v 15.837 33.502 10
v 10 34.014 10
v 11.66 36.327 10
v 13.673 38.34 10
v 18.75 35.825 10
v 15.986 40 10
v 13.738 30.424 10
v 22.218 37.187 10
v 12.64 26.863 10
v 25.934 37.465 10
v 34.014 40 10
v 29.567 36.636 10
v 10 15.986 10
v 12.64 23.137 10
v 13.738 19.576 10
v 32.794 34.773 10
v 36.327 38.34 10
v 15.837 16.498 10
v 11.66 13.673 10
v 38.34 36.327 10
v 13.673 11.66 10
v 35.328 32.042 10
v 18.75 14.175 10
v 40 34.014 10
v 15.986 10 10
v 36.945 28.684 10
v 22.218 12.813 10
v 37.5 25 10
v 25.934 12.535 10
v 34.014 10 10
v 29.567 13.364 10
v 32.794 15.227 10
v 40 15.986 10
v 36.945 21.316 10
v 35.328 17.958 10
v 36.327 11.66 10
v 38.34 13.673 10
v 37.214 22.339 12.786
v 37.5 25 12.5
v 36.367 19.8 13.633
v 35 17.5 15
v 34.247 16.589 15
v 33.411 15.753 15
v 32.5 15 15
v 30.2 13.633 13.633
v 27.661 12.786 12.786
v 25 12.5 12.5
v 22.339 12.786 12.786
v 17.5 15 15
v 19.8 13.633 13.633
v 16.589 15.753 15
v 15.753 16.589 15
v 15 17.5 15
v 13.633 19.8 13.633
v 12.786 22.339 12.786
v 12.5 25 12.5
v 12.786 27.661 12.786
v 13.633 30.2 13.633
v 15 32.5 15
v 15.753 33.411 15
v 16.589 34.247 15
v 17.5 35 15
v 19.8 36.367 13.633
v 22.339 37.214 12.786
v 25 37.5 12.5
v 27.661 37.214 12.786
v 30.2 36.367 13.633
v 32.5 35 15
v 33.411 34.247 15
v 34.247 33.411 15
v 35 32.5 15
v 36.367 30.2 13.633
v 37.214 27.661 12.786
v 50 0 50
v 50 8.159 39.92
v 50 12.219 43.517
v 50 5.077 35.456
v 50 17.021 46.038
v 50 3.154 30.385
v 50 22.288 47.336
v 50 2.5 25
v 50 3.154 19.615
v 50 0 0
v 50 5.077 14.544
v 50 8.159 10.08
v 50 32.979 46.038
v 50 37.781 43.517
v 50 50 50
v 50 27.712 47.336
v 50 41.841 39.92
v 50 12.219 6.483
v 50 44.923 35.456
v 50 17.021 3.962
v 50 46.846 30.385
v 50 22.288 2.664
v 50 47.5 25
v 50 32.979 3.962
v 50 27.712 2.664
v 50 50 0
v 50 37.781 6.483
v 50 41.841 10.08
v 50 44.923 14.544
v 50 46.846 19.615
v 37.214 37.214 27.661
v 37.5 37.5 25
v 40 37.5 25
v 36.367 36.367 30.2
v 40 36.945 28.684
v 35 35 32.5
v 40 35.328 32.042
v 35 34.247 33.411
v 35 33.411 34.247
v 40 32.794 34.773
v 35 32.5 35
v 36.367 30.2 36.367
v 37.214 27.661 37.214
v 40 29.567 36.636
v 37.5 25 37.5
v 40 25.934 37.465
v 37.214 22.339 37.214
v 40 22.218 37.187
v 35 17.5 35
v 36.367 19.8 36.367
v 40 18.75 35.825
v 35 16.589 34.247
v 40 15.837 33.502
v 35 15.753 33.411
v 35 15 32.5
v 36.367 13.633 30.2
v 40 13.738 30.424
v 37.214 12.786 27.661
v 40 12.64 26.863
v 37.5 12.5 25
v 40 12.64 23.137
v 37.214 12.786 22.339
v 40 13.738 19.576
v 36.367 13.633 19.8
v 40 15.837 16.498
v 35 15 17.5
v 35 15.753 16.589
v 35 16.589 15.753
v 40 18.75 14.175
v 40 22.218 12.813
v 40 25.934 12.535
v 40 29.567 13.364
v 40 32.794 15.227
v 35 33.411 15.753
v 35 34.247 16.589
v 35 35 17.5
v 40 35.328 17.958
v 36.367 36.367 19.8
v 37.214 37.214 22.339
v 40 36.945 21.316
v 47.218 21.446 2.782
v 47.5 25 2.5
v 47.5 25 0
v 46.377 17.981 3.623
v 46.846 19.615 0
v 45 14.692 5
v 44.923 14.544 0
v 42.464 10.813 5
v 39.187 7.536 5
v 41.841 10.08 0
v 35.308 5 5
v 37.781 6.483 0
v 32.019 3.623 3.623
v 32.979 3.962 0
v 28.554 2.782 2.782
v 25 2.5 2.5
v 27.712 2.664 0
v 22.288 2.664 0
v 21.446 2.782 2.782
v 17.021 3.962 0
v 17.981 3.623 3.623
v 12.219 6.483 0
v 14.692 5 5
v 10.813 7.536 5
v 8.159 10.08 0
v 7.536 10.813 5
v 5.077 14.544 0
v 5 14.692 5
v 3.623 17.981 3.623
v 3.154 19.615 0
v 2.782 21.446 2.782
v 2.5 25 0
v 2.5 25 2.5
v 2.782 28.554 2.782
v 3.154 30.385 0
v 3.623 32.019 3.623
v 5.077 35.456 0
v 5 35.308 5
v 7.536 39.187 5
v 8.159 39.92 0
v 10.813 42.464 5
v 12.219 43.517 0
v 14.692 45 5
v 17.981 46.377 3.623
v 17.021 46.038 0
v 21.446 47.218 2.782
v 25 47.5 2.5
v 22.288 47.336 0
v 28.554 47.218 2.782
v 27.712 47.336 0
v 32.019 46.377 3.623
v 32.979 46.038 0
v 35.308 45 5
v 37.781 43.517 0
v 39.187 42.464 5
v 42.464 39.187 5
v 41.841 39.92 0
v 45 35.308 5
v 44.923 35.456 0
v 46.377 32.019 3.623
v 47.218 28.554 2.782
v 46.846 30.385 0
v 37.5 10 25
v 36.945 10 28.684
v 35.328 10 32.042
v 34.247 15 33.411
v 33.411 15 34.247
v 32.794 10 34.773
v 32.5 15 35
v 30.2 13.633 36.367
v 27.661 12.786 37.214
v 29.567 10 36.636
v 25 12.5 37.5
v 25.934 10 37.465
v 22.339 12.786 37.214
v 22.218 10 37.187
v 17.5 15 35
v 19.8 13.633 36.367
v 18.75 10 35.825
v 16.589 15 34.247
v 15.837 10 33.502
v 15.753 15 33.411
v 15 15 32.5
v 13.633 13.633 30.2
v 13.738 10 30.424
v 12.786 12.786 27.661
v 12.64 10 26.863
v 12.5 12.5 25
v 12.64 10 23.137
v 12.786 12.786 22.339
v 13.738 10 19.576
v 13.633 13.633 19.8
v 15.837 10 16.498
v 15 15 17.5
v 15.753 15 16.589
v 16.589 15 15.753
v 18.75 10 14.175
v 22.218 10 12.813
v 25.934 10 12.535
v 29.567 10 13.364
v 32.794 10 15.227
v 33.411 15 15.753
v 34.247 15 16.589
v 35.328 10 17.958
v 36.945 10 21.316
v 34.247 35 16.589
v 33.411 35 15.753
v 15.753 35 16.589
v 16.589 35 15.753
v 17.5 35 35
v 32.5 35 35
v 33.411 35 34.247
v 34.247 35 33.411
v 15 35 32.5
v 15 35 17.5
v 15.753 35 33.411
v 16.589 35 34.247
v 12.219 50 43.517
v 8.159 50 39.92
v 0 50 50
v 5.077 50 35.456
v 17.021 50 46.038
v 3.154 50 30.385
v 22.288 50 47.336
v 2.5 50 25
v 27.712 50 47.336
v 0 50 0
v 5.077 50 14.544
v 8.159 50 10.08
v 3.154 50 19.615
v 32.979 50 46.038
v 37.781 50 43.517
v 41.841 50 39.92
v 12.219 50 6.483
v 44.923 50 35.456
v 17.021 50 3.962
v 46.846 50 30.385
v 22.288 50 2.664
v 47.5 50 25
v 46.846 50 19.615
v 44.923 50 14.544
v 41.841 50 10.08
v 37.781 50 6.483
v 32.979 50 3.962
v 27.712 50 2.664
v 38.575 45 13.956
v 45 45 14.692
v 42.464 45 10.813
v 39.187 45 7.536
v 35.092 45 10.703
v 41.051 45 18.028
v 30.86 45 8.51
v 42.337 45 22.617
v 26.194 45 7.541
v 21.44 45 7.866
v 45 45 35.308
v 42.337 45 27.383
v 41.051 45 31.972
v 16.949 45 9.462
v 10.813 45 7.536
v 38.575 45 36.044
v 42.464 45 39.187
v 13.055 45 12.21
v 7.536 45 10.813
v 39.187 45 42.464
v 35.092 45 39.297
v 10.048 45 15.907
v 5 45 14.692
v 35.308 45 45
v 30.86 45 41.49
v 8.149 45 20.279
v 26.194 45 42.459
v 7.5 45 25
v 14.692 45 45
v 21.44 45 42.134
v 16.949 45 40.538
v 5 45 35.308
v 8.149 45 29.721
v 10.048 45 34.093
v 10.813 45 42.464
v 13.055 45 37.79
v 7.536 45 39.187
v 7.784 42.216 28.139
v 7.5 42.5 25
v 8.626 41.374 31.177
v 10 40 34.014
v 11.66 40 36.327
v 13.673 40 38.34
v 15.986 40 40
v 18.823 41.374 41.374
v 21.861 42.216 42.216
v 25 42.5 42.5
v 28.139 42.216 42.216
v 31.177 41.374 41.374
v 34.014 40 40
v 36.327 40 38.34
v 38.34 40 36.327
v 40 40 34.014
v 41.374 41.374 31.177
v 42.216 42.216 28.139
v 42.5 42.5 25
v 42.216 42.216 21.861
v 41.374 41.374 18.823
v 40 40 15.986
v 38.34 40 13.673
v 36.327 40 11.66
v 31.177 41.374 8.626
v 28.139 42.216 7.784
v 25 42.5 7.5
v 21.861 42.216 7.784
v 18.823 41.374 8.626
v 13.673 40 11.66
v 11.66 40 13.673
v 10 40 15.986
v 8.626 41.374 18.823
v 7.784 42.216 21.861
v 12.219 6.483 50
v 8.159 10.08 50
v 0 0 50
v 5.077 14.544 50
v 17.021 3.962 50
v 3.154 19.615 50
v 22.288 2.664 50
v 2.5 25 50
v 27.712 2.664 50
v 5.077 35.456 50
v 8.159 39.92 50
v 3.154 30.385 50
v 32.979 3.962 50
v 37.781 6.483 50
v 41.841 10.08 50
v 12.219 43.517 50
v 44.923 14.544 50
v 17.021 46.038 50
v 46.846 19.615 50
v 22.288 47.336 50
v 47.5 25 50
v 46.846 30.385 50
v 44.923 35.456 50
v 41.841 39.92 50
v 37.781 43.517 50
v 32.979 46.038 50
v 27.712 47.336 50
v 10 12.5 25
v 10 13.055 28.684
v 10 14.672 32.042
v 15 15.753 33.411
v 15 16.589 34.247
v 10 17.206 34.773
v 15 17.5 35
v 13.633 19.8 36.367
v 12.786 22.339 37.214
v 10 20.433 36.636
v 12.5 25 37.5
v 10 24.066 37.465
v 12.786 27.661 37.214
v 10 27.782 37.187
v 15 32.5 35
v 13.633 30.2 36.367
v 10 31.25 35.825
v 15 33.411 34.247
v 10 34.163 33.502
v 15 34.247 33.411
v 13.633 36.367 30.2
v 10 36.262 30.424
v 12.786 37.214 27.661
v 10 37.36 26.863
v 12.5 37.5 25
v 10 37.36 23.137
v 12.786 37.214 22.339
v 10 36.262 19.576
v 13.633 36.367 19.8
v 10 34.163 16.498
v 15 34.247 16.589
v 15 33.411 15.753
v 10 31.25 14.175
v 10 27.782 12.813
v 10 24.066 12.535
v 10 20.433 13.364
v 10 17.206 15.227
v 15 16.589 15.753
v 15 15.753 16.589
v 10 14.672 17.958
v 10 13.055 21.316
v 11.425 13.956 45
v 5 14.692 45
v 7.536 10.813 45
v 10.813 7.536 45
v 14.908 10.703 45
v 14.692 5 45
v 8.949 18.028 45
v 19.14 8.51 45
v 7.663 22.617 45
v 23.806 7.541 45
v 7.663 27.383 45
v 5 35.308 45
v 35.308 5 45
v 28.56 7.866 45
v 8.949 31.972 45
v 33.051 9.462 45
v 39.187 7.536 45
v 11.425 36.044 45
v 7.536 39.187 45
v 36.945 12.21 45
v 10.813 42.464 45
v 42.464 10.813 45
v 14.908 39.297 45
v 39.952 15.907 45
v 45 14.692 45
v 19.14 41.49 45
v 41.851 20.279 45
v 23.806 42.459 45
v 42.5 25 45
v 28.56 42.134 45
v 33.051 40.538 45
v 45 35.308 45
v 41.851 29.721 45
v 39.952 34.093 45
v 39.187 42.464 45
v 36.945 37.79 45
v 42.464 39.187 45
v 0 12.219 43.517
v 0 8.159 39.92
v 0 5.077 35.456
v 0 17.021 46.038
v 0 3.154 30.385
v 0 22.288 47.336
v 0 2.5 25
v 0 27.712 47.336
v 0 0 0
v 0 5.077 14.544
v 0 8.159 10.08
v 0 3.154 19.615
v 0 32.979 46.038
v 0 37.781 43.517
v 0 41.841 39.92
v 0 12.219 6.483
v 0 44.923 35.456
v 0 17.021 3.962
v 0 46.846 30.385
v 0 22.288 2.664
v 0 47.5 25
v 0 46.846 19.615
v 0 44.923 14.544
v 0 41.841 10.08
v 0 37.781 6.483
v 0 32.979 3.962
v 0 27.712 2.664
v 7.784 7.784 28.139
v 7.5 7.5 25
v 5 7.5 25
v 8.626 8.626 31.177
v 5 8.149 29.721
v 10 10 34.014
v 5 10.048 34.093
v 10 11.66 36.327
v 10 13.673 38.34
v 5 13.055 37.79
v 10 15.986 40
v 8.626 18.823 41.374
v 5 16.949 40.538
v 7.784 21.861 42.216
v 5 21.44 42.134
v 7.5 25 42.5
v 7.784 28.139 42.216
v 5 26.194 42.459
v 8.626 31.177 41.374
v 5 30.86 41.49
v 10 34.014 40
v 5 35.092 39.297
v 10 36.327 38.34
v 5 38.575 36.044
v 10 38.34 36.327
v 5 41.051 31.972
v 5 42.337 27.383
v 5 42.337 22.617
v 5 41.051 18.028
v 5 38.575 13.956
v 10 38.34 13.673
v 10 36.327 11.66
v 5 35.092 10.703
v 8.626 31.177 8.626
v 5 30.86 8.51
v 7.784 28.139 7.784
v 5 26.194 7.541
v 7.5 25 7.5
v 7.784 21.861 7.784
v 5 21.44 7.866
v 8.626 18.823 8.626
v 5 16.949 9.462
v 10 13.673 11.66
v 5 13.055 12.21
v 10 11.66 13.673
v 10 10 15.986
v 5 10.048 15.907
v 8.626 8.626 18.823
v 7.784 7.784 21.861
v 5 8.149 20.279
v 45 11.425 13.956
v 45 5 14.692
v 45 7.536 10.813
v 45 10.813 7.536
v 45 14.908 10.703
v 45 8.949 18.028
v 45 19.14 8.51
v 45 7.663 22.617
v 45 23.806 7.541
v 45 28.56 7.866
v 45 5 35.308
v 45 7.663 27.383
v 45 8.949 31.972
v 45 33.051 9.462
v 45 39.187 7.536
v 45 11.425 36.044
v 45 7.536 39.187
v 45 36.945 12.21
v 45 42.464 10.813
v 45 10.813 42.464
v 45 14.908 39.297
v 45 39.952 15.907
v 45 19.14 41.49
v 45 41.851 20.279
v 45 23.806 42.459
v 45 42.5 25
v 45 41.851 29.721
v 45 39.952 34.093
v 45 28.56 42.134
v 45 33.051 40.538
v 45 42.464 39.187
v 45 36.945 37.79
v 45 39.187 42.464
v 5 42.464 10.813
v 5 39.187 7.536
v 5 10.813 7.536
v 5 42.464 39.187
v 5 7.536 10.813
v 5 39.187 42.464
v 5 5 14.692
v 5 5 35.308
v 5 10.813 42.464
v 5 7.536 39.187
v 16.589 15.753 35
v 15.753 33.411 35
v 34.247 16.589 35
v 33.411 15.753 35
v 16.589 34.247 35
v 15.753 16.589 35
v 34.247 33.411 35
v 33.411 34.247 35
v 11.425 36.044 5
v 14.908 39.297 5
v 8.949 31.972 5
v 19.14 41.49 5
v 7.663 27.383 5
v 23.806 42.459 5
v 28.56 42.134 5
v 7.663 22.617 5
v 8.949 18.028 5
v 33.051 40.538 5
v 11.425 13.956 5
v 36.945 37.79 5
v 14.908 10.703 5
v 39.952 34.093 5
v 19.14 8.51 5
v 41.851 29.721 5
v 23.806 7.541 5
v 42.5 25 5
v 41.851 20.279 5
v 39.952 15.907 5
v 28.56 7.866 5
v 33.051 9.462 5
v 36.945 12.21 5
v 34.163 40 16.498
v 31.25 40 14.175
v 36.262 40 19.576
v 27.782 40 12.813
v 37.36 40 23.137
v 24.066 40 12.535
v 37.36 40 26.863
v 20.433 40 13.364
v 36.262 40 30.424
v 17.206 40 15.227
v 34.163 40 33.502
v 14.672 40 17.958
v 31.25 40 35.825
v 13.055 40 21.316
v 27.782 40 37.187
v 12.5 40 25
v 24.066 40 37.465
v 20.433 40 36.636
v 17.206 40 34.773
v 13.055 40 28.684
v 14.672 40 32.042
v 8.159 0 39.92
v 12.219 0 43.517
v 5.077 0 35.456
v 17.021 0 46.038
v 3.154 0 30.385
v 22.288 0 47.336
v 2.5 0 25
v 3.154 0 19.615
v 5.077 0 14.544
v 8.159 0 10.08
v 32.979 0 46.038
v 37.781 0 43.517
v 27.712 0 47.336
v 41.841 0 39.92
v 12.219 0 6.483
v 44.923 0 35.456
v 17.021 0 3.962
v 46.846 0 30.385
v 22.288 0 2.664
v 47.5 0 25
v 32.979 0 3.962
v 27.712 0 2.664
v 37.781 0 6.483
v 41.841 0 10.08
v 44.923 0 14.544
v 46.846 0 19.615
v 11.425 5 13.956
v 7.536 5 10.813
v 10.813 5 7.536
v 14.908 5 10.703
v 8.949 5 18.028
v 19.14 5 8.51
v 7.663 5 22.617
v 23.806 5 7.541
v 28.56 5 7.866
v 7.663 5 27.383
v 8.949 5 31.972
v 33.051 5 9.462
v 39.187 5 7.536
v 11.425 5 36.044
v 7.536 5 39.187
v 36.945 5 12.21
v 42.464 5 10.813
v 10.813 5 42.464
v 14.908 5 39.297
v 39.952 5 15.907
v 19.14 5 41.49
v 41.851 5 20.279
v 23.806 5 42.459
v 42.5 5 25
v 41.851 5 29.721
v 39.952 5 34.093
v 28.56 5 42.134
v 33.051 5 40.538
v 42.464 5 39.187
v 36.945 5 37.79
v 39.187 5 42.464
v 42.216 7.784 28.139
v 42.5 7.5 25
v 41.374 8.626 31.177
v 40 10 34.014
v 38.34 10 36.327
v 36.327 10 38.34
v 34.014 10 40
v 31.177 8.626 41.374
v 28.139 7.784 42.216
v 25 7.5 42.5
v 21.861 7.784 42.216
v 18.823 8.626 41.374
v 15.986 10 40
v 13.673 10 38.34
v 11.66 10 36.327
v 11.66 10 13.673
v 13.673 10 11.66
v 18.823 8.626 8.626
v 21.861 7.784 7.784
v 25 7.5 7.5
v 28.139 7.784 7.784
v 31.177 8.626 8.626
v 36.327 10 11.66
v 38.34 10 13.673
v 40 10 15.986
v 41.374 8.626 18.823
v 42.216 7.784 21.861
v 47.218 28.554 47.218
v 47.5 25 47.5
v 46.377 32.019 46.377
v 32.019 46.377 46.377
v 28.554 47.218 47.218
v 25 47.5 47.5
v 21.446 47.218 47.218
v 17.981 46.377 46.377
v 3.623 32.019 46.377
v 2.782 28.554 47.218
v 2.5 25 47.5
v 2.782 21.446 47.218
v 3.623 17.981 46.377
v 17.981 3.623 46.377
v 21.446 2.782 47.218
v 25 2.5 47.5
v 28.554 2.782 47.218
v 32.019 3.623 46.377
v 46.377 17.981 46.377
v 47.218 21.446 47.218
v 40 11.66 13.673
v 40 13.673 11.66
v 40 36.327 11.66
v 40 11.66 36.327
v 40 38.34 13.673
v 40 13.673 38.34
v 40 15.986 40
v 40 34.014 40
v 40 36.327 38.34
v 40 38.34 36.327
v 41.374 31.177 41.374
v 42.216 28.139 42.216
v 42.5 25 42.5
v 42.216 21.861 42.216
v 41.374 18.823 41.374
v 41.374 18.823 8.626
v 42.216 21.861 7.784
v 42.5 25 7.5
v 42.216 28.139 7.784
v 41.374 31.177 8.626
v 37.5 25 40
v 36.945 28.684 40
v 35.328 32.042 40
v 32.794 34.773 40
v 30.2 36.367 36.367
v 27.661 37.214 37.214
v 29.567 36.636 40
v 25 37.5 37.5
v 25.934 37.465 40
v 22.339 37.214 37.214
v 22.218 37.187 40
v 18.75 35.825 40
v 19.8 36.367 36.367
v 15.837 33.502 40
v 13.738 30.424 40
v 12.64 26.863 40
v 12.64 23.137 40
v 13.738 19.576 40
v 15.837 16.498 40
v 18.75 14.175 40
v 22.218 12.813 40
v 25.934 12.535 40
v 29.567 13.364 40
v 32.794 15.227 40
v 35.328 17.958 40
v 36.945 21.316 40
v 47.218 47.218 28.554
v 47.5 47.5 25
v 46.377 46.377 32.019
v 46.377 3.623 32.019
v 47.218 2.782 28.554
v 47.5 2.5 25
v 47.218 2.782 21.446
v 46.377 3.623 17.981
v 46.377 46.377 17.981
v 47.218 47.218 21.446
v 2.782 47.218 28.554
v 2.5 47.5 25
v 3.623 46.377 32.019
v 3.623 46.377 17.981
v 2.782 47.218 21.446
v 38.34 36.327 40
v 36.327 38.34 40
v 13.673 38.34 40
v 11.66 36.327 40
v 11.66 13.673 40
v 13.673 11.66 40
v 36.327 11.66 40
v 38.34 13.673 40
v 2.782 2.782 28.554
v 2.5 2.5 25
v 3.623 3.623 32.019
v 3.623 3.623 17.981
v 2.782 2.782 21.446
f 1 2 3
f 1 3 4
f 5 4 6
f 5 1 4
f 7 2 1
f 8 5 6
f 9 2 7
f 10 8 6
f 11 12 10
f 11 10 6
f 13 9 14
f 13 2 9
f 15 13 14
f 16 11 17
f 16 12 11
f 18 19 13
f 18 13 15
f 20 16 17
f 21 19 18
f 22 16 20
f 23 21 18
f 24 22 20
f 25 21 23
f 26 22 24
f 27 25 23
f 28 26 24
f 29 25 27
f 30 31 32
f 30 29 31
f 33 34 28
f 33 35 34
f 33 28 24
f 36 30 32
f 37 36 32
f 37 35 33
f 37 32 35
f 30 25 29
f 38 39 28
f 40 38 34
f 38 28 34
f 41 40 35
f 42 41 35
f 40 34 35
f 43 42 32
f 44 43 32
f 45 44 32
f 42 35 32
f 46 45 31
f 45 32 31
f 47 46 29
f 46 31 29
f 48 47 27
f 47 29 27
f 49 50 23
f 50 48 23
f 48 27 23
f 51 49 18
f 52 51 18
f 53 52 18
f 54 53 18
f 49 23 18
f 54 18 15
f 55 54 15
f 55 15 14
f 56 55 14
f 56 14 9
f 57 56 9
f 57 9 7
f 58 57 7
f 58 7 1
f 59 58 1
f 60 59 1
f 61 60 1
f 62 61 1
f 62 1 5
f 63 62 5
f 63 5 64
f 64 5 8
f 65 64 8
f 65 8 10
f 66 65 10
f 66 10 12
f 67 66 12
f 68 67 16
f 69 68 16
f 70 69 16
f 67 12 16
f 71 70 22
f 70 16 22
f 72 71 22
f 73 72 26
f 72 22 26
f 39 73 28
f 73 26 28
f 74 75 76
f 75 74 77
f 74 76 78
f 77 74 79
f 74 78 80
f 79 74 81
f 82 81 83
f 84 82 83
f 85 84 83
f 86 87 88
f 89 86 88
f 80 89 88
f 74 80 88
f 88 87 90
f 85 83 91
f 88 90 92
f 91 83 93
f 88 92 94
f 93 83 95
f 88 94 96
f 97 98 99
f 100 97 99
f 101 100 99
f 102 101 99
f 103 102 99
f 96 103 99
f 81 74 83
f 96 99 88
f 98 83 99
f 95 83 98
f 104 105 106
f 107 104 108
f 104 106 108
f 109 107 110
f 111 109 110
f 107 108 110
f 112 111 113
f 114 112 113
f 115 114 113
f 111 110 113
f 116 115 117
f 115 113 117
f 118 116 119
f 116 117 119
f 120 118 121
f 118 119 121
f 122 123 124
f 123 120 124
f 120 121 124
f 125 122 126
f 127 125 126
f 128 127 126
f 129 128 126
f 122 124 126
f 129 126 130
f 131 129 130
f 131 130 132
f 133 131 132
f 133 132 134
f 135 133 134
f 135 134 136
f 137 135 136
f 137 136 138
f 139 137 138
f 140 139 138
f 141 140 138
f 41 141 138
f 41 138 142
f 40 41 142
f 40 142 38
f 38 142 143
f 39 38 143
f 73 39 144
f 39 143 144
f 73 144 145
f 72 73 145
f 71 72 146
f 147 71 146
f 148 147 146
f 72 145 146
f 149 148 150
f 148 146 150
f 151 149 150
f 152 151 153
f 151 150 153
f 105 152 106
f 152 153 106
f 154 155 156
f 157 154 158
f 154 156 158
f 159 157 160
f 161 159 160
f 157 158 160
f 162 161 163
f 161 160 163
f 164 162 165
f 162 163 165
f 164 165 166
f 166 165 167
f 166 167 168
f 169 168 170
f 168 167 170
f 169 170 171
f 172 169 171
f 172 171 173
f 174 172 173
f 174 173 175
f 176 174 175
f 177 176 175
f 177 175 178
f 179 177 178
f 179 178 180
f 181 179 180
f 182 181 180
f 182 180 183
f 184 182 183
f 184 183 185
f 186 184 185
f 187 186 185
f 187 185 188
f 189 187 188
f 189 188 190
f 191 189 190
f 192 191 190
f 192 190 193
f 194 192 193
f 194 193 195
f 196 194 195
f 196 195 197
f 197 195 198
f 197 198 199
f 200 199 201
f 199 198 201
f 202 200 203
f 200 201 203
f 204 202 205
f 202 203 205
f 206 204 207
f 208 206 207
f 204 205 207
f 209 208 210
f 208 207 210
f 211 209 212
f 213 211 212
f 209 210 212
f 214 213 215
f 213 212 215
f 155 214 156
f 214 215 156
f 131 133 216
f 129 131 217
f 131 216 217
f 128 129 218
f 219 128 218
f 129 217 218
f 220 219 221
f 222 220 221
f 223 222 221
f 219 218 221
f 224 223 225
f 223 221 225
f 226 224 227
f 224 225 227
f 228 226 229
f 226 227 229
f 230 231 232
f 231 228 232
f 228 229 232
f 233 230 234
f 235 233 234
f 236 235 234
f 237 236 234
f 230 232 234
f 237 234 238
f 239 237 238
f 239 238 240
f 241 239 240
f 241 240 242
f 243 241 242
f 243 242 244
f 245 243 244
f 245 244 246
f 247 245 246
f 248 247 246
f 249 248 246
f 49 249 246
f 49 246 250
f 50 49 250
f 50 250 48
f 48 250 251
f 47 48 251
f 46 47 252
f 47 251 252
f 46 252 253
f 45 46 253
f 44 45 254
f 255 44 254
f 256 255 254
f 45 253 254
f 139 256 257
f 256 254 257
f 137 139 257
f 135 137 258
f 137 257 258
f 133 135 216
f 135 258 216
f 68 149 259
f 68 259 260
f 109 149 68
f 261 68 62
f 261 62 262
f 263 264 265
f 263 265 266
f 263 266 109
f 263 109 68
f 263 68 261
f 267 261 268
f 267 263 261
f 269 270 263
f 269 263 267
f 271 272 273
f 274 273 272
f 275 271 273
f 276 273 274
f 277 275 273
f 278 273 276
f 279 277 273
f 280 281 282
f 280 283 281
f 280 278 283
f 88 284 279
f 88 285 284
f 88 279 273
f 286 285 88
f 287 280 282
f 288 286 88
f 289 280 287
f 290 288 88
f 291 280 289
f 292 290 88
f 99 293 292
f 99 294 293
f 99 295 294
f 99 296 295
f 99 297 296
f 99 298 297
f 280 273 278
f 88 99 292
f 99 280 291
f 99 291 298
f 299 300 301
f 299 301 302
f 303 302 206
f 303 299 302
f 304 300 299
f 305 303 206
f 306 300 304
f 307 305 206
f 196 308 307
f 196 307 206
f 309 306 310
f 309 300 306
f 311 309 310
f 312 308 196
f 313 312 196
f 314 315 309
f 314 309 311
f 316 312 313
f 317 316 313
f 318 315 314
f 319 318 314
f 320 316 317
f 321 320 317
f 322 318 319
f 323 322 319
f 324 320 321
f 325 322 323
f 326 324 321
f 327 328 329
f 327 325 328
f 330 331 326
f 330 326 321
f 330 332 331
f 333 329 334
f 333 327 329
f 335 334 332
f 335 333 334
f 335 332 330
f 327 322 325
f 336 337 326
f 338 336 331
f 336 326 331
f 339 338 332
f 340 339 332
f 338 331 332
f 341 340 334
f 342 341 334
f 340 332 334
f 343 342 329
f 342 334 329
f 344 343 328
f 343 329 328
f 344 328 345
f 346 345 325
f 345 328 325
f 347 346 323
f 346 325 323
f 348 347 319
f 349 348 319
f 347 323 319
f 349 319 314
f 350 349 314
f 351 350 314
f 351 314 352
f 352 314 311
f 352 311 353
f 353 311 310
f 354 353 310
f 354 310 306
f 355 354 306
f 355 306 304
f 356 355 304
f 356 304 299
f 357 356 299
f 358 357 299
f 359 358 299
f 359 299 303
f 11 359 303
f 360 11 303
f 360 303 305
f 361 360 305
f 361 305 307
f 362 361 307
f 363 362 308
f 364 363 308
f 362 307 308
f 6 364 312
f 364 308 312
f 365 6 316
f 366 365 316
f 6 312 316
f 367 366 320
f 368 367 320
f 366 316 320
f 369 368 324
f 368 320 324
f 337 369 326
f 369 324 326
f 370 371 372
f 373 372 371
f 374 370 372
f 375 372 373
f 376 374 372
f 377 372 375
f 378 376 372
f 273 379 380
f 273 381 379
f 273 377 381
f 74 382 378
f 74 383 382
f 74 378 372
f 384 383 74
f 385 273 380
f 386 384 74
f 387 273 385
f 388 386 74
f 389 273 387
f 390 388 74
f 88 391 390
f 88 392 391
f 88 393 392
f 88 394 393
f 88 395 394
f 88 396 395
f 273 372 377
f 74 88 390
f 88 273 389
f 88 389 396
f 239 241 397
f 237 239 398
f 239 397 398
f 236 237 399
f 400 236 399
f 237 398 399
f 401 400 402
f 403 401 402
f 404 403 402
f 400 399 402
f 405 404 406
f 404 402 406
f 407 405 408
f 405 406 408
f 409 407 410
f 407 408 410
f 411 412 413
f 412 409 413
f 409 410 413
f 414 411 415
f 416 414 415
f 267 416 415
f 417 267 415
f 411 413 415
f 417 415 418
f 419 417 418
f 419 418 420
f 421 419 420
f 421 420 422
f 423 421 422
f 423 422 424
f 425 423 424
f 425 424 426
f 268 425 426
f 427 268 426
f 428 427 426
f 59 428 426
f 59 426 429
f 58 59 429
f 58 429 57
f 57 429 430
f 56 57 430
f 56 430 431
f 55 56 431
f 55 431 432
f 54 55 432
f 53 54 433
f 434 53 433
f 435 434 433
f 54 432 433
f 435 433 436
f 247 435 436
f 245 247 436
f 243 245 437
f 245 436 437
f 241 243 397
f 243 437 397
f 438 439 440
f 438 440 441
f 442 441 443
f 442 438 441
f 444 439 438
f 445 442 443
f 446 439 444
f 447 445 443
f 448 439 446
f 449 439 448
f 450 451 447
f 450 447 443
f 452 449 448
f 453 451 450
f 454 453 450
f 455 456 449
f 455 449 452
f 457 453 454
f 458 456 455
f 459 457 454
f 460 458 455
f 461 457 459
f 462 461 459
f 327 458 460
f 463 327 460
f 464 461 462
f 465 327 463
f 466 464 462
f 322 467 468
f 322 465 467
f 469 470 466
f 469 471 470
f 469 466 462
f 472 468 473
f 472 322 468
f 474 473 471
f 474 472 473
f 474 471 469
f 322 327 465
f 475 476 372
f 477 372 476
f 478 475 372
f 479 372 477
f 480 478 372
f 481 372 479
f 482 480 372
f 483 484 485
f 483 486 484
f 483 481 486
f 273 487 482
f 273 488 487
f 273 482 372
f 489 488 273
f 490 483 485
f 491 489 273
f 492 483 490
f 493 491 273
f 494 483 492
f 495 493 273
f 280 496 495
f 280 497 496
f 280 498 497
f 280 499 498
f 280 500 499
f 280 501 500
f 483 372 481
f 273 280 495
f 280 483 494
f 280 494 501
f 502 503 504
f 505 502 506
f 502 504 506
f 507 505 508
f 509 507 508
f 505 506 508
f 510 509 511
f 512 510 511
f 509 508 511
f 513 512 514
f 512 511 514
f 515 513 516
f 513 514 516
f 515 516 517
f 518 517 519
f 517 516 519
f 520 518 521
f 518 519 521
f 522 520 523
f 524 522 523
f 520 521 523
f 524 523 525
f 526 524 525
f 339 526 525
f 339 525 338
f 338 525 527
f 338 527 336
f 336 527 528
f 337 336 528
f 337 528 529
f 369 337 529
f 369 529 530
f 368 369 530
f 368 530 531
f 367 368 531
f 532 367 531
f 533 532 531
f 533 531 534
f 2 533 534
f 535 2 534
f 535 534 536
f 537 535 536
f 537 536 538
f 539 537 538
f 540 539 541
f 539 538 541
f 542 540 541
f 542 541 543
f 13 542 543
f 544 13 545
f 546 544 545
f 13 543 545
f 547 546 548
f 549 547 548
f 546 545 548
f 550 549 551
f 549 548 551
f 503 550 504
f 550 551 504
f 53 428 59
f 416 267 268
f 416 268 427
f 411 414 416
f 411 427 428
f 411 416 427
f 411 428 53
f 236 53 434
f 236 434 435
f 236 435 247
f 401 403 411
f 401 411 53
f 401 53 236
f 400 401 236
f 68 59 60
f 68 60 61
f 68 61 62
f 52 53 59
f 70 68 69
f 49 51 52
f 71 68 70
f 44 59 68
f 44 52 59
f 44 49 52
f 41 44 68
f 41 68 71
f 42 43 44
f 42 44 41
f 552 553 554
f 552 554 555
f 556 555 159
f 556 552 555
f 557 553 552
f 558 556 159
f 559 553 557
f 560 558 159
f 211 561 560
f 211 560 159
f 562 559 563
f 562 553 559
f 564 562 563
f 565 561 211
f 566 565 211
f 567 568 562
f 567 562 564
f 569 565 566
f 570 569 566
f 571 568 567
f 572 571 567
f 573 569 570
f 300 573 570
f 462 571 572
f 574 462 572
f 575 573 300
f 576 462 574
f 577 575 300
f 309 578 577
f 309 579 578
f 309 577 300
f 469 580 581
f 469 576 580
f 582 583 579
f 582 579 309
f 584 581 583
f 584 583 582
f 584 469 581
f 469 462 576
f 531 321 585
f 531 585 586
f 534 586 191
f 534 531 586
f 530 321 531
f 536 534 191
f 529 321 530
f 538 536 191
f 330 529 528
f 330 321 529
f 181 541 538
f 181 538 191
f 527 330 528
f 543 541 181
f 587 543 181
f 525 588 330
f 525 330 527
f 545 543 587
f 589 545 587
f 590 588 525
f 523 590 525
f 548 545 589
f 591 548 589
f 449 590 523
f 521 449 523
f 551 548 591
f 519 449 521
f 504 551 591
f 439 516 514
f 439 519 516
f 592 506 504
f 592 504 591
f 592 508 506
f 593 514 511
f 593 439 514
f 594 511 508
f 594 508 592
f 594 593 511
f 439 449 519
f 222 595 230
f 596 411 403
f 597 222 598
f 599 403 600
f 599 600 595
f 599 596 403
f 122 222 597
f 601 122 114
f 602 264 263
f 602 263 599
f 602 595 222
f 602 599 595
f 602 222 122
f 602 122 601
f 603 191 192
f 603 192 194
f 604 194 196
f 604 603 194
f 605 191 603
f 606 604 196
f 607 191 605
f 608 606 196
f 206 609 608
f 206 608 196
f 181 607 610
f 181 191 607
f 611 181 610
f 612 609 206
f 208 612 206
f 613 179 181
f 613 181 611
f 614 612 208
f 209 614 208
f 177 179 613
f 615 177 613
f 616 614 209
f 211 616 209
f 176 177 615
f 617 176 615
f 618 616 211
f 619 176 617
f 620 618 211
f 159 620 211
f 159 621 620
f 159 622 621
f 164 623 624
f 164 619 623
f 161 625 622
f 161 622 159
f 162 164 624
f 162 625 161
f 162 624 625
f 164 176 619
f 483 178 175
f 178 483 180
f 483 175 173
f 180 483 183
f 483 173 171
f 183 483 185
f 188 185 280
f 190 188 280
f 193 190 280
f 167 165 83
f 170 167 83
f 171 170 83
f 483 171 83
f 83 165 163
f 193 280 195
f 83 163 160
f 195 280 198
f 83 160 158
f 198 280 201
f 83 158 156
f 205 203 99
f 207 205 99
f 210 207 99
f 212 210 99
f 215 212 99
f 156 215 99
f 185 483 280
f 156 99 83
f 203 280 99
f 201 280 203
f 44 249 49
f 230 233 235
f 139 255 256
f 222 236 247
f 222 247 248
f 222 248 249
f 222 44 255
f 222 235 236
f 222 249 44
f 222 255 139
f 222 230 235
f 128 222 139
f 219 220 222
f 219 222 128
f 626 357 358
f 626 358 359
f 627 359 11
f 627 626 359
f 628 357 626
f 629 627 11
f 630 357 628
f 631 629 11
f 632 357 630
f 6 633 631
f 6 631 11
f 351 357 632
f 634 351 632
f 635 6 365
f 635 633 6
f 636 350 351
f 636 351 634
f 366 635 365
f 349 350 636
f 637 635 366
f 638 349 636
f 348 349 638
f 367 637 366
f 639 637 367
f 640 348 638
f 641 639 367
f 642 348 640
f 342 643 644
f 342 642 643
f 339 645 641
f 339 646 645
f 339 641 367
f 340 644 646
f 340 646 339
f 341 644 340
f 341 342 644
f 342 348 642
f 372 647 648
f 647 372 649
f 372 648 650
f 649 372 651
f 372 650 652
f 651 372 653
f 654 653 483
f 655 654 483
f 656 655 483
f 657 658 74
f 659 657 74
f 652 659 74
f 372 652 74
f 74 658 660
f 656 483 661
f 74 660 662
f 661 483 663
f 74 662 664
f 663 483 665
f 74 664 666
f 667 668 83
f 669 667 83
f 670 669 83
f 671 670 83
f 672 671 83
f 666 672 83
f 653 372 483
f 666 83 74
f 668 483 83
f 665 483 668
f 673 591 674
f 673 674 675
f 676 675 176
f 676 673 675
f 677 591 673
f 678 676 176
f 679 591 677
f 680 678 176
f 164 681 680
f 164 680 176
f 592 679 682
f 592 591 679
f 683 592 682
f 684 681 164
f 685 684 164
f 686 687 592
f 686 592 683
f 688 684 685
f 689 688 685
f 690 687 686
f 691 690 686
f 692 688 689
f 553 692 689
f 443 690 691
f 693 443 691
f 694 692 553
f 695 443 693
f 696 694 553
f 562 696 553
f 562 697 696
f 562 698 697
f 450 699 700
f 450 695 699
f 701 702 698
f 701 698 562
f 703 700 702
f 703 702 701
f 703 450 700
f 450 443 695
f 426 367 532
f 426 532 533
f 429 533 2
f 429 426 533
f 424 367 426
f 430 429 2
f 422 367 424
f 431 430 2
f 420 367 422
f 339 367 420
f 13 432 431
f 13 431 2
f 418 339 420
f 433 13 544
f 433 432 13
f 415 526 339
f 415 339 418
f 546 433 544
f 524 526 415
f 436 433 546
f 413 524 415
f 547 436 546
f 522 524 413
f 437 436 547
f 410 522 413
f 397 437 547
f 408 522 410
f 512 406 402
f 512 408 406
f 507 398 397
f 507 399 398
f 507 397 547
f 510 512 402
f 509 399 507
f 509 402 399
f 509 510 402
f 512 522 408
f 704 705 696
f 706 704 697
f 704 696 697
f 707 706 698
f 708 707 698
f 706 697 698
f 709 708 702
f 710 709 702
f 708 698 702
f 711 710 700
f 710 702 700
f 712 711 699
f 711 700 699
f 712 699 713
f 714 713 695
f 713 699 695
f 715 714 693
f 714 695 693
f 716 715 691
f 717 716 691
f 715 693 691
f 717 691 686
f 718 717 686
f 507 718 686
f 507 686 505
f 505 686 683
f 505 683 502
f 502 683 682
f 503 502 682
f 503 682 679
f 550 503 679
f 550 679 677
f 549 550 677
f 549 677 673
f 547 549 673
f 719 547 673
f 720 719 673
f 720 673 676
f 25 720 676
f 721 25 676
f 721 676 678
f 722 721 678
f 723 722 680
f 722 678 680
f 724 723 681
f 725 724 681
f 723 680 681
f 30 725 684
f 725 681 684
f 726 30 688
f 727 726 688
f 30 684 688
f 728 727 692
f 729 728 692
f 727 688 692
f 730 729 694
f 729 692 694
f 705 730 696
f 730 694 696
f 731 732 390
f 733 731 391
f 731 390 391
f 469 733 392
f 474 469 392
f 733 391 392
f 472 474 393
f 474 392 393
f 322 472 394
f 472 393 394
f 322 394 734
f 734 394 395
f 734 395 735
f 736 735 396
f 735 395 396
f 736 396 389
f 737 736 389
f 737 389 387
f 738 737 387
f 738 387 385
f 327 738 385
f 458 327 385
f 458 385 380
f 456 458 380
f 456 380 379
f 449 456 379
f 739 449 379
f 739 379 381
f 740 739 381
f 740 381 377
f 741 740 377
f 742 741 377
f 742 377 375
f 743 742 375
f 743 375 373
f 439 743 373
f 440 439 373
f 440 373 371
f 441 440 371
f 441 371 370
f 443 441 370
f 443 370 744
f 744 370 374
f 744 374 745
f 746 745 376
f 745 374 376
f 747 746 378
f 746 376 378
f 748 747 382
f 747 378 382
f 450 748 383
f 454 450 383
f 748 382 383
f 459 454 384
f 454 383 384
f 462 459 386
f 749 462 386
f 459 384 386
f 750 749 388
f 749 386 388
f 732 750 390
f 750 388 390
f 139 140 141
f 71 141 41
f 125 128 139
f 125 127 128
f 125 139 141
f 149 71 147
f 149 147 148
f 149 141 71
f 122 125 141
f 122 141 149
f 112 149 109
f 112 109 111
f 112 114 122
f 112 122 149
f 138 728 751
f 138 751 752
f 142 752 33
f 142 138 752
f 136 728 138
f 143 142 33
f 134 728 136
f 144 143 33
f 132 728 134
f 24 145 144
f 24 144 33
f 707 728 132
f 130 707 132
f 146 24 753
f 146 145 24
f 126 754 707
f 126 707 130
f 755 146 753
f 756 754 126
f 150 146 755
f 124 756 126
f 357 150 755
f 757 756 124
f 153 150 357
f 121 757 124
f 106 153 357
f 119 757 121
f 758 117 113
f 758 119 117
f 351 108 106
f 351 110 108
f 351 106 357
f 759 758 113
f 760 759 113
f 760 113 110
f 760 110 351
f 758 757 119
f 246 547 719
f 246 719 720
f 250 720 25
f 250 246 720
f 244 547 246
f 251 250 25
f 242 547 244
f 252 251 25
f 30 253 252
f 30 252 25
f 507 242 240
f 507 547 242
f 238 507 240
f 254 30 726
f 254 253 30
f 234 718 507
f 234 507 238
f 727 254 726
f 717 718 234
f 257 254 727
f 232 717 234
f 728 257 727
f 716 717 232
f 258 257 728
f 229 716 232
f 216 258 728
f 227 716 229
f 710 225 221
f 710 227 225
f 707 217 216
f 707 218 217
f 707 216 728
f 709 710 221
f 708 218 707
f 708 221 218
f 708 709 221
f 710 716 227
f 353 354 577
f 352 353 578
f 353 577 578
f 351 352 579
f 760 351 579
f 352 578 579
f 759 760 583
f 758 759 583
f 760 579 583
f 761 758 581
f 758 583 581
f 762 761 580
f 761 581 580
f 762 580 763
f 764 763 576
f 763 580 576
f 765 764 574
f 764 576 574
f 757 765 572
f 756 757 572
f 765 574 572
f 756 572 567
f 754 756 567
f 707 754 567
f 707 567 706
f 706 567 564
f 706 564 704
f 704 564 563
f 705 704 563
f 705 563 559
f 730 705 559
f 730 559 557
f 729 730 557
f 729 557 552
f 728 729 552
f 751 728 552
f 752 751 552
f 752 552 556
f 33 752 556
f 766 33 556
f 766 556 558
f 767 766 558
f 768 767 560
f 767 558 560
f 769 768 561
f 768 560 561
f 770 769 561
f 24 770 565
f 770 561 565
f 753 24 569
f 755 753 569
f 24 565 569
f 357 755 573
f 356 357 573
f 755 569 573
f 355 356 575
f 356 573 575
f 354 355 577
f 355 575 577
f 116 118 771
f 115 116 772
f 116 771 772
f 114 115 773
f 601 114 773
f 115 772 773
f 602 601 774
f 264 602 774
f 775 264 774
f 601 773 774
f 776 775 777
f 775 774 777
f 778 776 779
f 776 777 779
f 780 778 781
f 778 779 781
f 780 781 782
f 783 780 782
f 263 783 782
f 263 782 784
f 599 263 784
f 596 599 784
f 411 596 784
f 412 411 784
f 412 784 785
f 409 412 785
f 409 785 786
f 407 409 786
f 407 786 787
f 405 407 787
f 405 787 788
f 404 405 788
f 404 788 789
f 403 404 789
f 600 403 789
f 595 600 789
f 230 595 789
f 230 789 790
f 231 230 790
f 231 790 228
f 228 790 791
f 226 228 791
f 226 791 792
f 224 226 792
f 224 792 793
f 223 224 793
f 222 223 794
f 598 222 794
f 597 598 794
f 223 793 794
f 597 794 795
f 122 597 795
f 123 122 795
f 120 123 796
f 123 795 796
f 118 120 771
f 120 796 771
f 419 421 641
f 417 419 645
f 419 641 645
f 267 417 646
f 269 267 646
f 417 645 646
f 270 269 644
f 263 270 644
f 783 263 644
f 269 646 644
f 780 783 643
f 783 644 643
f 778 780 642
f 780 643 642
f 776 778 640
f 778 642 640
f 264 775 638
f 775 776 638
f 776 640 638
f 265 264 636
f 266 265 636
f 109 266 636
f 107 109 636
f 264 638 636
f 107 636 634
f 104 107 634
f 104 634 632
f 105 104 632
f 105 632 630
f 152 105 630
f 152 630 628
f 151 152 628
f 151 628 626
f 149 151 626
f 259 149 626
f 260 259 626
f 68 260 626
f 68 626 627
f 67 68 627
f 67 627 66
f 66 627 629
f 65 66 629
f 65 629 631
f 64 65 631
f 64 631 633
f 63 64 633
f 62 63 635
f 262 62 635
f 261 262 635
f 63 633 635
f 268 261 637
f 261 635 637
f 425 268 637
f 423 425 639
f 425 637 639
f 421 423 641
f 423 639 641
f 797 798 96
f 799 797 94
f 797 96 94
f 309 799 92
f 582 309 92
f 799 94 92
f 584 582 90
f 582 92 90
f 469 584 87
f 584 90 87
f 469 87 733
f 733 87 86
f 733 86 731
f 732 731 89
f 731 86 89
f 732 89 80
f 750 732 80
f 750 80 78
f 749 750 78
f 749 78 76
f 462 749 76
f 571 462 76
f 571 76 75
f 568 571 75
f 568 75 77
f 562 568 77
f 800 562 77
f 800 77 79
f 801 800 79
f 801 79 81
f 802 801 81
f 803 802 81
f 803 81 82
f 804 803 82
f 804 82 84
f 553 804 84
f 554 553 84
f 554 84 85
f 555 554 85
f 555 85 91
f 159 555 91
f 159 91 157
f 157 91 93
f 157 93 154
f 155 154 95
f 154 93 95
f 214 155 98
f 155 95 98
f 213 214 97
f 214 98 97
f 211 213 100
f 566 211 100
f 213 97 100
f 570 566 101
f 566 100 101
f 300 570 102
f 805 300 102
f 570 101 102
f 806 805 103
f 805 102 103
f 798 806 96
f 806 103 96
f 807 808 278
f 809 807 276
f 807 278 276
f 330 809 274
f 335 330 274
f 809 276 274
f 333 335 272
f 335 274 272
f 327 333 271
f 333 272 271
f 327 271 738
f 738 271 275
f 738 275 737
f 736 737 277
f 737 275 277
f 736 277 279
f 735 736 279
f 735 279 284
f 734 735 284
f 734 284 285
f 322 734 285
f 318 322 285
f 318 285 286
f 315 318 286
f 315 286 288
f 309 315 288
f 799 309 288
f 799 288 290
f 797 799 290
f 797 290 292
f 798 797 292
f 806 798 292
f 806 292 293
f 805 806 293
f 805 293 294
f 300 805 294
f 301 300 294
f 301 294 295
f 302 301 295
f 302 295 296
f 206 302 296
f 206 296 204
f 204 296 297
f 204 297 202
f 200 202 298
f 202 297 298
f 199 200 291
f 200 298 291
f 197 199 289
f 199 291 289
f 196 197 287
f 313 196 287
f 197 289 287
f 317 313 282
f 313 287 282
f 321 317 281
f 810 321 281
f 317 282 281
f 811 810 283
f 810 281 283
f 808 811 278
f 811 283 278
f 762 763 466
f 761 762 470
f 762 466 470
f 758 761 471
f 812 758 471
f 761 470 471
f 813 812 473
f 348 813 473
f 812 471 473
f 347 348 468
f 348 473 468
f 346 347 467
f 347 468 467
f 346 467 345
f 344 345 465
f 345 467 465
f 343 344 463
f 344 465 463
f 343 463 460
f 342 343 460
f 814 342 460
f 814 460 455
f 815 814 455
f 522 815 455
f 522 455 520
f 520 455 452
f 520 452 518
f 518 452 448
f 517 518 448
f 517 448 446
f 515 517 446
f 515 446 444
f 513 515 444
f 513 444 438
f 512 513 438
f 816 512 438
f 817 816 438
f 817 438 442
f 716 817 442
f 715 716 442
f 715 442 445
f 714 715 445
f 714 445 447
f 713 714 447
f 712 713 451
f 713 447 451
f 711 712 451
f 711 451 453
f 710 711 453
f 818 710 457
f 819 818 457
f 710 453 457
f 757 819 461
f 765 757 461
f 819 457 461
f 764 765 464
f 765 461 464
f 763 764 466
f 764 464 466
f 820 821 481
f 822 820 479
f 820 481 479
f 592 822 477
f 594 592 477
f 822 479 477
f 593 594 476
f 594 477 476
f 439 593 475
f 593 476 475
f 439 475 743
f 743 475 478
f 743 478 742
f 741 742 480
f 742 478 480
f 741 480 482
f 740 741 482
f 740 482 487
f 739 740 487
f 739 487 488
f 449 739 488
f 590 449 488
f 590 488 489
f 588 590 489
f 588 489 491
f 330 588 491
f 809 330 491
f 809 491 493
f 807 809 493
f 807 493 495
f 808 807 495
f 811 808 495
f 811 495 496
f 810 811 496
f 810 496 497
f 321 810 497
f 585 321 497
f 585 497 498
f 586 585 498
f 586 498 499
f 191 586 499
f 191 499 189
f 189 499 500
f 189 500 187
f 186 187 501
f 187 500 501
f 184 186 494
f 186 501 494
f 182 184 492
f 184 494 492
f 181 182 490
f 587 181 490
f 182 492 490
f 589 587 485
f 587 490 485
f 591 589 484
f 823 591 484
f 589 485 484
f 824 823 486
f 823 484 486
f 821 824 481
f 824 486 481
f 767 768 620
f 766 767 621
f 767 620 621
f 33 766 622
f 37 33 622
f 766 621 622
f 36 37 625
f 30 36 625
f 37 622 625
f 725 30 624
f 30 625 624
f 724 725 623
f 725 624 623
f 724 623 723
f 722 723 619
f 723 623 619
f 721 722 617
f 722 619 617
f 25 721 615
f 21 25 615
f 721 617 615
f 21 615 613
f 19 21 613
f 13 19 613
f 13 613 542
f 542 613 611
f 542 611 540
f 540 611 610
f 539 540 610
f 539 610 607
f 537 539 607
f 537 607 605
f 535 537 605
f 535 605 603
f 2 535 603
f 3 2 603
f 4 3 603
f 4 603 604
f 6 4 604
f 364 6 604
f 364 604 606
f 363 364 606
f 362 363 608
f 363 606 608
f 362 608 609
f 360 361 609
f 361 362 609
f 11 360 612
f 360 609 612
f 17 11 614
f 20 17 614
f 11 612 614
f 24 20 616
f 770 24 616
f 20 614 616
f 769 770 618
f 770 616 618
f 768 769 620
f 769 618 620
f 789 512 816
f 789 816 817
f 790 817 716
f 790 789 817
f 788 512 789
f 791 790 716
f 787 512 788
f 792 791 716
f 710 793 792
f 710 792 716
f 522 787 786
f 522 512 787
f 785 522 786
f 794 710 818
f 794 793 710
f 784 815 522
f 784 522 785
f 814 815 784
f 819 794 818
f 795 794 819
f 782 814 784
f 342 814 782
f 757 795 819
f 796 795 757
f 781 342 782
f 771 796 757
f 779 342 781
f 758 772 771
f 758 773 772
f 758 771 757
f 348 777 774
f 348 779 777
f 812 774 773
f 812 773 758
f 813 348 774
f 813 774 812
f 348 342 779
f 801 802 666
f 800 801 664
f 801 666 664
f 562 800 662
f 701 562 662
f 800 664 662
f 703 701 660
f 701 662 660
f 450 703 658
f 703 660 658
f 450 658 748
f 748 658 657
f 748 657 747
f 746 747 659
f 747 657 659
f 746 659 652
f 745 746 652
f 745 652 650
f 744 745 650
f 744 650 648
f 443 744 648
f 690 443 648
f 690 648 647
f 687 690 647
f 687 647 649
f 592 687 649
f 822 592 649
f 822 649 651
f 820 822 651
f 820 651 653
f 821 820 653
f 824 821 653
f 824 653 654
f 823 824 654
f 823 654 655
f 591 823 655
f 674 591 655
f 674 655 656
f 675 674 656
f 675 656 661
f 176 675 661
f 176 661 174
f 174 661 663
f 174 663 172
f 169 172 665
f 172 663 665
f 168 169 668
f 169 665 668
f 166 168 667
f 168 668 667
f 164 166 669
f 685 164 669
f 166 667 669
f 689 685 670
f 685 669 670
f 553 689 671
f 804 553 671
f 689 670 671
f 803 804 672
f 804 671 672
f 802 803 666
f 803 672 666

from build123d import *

# Parameters (mm, degrees)
F0_W      = 50
F0_H      = 50
F1_DEPTH  = 50
F2_R      = 22.5
F3_DEPTH  = 5
F4_R      = 17.5
F5_DEPTH  = 5
F6_R      = 12.5
F7_DEPTH  = 5
F8_R      = 22.5
F9_DEPTH  = 5
F10_R     = 17.5
F11_DEPTH = 5
F12_R     = 12.5
F13_DEPTH = 5
F14_R     = 22.5
F15_DEPTH = 5
F16_R     = 17.5
F17_DEPTH = 5
F18_R     = 12.5
F19_DEPTH = 5
F20_R     = 22.5
F21_DEPTH = 5
F22_R     = 17.5
F23_DEPTH = 5
F24_R     = 12.5
F25_DEPTH = 5
F26_R     = 22.5
F27_DEPTH = 5
F28_R     = 17.5
F29_DEPTH = 5
F30_R     = 12.5
F31_DEPTH = 5
F32_R     = 22.5
F33_DEPTH = 5
F34_R     = 17.5
F35_DEPTH = 5
F36_R     = 12.5
F37_DEPTH = 5


with BuildPart() as f1:
    # F0 (on Top) → F1 (new body)
    with BuildSketch(Plane.XY):
        with Locations((25, 25)):
            Rectangle(F0_W, F0_H)
    extrude(amount=F1_DEPTH)

    # F2 (on face) → F3 (cut)
    with BuildSketch(Plane.XY.offset(50)):
        with Locations((25, 25)):
            Circle(F2_R)
    extrude(amount=-F3_DEPTH, mode=Mode.SUBTRACT)

    # F4 (on face) → F5 (cut)
    with BuildSketch(Plane.XY.offset(45)):
        with Locations((25, 25)):
            Circle(F4_R)
    extrude(amount=-F5_DEPTH, mode=Mode.SUBTRACT)

    # F6 (on face) → F7 (cut)
    with BuildSketch(Plane.XY.offset(40)):
        with Locations((25, 25)):
            Circle(F6_R)
    extrude(amount=-F7_DEPTH, mode=Mode.SUBTRACT)

    # F8 (on face) → F9 (cut)
    with BuildSketch(Plane(origin=(0, 0, 0), x_dir=(0, -1, 0), z_dir=(-1, 0, 0))):
        with Locations((-25, 25)):
            Circle(F8_R)
    extrude(amount=-F9_DEPTH, mode=Mode.SUBTRACT)

    # F10 (on face) → F11 (cut)
    with BuildSketch(Plane(origin=(5, 0, 0), x_dir=(0, -1, 0), z_dir=(-1, 0, 0))):
        with Locations((-25, 25)):
            Circle(F10_R)
    extrude(amount=-F11_DEPTH, mode=Mode.SUBTRACT)

    # F12 (on face) → F13 (cut)
    with BuildSketch(Plane(origin=(10, 0, 0), x_dir=(0, -1, 0), z_dir=(-1, 0, 0))):
        with Locations((-25, 25)):
            Circle(F12_R)
    extrude(amount=-F13_DEPTH, mode=Mode.SUBTRACT)

    # F14 (on face) → F15 (cut)
    with BuildSketch(Plane.XZ):
        with Locations((25, 25)):
            Circle(F14_R)
    extrude(amount=-F15_DEPTH, mode=Mode.SUBTRACT)

    # F16 (on face) → F17 (cut)
    with BuildSketch(Plane.XZ.offset(-5)):
        with Locations((25, 25)):
            Circle(F16_R)
    extrude(amount=-F17_DEPTH, mode=Mode.SUBTRACT)

    # F18 (on face) → F19 (cut)
    with BuildSketch(Plane.XZ.offset(-10)):
        with Locations((25, 25)):
            Circle(F18_R)
    extrude(amount=-F19_DEPTH, mode=Mode.SUBTRACT)

    # F20 (on face) → F21 (cut)
    with BuildSketch(Plane.YZ.offset(50)):
        with Locations((25, 25)):
            Circle(F20_R)
    extrude(amount=-F21_DEPTH, mode=Mode.SUBTRACT)

    # F22 (on face) → F23 (cut)
    with BuildSketch(Plane.YZ.offset(45)):
        with Locations((25, 25)):
            Circle(F22_R)
    extrude(amount=-F23_DEPTH, mode=Mode.SUBTRACT)

    # F24 (on face) → F25 (cut)
    with BuildSketch(Plane.YZ.offset(40)):
        with Locations((25, 25)):
            Circle(F24_R)
    extrude(amount=-F25_DEPTH, mode=Mode.SUBTRACT)

    # F26 (on face) → F27 (cut)
    with BuildSketch(Plane(origin=(0, 50, 0), x_dir=(-1, 0, 0), z_dir=(0, 1, 0))):
        with Locations((-25, 25)):
            Circle(F26_R)
    extrude(amount=-F27_DEPTH, mode=Mode.SUBTRACT)

    # F28 (on face) → F29 (cut)
    with BuildSketch(Plane(origin=(0, 45, 0), x_dir=(-1, 0, 0), z_dir=(0, 1, 0))):
        with Locations((-25, 25)):
            Circle(F28_R)
    extrude(amount=-F29_DEPTH, mode=Mode.SUBTRACT)

    # F30 (on face) → F31 (cut)
    with BuildSketch(Plane(origin=(0, 40, 0), x_dir=(-1, 0, 0), z_dir=(0, 1, 0))):
        with Locations((-25, 25)):
            Circle(F30_R)
    extrude(amount=-F31_DEPTH, mode=Mode.SUBTRACT)

    # F32 (on face) → F33 (cut)
    with BuildSketch(Plane(origin=(0, 0, 0), x_dir=(1, 0, 0), z_dir=(0, 0, -1))):
        with Locations((25, -25)):
            Circle(F32_R)
    extrude(amount=-F33_DEPTH, mode=Mode.SUBTRACT)

    # F34 (on face) → F35 (cut)
    with BuildSketch(Plane(origin=(0, 0, 5), x_dir=(1, 0, 0), z_dir=(0, 0, -1))):
        with Locations((25, -25)):
            Circle(F34_R)
    extrude(amount=-F35_DEPTH, mode=Mode.SUBTRACT)

    # F36 (on face) → F37 (cut)
    with BuildSketch(Plane(origin=(0, 0, 10), x_dir=(1, 0, 0), z_dir=(0, 0, -1))):
        with Locations((25, -25)):
            Circle(F36_R)
    extrude(amount=-F37_DEPTH, mode=Mode.SUBTRACT)


solid = f1.part
